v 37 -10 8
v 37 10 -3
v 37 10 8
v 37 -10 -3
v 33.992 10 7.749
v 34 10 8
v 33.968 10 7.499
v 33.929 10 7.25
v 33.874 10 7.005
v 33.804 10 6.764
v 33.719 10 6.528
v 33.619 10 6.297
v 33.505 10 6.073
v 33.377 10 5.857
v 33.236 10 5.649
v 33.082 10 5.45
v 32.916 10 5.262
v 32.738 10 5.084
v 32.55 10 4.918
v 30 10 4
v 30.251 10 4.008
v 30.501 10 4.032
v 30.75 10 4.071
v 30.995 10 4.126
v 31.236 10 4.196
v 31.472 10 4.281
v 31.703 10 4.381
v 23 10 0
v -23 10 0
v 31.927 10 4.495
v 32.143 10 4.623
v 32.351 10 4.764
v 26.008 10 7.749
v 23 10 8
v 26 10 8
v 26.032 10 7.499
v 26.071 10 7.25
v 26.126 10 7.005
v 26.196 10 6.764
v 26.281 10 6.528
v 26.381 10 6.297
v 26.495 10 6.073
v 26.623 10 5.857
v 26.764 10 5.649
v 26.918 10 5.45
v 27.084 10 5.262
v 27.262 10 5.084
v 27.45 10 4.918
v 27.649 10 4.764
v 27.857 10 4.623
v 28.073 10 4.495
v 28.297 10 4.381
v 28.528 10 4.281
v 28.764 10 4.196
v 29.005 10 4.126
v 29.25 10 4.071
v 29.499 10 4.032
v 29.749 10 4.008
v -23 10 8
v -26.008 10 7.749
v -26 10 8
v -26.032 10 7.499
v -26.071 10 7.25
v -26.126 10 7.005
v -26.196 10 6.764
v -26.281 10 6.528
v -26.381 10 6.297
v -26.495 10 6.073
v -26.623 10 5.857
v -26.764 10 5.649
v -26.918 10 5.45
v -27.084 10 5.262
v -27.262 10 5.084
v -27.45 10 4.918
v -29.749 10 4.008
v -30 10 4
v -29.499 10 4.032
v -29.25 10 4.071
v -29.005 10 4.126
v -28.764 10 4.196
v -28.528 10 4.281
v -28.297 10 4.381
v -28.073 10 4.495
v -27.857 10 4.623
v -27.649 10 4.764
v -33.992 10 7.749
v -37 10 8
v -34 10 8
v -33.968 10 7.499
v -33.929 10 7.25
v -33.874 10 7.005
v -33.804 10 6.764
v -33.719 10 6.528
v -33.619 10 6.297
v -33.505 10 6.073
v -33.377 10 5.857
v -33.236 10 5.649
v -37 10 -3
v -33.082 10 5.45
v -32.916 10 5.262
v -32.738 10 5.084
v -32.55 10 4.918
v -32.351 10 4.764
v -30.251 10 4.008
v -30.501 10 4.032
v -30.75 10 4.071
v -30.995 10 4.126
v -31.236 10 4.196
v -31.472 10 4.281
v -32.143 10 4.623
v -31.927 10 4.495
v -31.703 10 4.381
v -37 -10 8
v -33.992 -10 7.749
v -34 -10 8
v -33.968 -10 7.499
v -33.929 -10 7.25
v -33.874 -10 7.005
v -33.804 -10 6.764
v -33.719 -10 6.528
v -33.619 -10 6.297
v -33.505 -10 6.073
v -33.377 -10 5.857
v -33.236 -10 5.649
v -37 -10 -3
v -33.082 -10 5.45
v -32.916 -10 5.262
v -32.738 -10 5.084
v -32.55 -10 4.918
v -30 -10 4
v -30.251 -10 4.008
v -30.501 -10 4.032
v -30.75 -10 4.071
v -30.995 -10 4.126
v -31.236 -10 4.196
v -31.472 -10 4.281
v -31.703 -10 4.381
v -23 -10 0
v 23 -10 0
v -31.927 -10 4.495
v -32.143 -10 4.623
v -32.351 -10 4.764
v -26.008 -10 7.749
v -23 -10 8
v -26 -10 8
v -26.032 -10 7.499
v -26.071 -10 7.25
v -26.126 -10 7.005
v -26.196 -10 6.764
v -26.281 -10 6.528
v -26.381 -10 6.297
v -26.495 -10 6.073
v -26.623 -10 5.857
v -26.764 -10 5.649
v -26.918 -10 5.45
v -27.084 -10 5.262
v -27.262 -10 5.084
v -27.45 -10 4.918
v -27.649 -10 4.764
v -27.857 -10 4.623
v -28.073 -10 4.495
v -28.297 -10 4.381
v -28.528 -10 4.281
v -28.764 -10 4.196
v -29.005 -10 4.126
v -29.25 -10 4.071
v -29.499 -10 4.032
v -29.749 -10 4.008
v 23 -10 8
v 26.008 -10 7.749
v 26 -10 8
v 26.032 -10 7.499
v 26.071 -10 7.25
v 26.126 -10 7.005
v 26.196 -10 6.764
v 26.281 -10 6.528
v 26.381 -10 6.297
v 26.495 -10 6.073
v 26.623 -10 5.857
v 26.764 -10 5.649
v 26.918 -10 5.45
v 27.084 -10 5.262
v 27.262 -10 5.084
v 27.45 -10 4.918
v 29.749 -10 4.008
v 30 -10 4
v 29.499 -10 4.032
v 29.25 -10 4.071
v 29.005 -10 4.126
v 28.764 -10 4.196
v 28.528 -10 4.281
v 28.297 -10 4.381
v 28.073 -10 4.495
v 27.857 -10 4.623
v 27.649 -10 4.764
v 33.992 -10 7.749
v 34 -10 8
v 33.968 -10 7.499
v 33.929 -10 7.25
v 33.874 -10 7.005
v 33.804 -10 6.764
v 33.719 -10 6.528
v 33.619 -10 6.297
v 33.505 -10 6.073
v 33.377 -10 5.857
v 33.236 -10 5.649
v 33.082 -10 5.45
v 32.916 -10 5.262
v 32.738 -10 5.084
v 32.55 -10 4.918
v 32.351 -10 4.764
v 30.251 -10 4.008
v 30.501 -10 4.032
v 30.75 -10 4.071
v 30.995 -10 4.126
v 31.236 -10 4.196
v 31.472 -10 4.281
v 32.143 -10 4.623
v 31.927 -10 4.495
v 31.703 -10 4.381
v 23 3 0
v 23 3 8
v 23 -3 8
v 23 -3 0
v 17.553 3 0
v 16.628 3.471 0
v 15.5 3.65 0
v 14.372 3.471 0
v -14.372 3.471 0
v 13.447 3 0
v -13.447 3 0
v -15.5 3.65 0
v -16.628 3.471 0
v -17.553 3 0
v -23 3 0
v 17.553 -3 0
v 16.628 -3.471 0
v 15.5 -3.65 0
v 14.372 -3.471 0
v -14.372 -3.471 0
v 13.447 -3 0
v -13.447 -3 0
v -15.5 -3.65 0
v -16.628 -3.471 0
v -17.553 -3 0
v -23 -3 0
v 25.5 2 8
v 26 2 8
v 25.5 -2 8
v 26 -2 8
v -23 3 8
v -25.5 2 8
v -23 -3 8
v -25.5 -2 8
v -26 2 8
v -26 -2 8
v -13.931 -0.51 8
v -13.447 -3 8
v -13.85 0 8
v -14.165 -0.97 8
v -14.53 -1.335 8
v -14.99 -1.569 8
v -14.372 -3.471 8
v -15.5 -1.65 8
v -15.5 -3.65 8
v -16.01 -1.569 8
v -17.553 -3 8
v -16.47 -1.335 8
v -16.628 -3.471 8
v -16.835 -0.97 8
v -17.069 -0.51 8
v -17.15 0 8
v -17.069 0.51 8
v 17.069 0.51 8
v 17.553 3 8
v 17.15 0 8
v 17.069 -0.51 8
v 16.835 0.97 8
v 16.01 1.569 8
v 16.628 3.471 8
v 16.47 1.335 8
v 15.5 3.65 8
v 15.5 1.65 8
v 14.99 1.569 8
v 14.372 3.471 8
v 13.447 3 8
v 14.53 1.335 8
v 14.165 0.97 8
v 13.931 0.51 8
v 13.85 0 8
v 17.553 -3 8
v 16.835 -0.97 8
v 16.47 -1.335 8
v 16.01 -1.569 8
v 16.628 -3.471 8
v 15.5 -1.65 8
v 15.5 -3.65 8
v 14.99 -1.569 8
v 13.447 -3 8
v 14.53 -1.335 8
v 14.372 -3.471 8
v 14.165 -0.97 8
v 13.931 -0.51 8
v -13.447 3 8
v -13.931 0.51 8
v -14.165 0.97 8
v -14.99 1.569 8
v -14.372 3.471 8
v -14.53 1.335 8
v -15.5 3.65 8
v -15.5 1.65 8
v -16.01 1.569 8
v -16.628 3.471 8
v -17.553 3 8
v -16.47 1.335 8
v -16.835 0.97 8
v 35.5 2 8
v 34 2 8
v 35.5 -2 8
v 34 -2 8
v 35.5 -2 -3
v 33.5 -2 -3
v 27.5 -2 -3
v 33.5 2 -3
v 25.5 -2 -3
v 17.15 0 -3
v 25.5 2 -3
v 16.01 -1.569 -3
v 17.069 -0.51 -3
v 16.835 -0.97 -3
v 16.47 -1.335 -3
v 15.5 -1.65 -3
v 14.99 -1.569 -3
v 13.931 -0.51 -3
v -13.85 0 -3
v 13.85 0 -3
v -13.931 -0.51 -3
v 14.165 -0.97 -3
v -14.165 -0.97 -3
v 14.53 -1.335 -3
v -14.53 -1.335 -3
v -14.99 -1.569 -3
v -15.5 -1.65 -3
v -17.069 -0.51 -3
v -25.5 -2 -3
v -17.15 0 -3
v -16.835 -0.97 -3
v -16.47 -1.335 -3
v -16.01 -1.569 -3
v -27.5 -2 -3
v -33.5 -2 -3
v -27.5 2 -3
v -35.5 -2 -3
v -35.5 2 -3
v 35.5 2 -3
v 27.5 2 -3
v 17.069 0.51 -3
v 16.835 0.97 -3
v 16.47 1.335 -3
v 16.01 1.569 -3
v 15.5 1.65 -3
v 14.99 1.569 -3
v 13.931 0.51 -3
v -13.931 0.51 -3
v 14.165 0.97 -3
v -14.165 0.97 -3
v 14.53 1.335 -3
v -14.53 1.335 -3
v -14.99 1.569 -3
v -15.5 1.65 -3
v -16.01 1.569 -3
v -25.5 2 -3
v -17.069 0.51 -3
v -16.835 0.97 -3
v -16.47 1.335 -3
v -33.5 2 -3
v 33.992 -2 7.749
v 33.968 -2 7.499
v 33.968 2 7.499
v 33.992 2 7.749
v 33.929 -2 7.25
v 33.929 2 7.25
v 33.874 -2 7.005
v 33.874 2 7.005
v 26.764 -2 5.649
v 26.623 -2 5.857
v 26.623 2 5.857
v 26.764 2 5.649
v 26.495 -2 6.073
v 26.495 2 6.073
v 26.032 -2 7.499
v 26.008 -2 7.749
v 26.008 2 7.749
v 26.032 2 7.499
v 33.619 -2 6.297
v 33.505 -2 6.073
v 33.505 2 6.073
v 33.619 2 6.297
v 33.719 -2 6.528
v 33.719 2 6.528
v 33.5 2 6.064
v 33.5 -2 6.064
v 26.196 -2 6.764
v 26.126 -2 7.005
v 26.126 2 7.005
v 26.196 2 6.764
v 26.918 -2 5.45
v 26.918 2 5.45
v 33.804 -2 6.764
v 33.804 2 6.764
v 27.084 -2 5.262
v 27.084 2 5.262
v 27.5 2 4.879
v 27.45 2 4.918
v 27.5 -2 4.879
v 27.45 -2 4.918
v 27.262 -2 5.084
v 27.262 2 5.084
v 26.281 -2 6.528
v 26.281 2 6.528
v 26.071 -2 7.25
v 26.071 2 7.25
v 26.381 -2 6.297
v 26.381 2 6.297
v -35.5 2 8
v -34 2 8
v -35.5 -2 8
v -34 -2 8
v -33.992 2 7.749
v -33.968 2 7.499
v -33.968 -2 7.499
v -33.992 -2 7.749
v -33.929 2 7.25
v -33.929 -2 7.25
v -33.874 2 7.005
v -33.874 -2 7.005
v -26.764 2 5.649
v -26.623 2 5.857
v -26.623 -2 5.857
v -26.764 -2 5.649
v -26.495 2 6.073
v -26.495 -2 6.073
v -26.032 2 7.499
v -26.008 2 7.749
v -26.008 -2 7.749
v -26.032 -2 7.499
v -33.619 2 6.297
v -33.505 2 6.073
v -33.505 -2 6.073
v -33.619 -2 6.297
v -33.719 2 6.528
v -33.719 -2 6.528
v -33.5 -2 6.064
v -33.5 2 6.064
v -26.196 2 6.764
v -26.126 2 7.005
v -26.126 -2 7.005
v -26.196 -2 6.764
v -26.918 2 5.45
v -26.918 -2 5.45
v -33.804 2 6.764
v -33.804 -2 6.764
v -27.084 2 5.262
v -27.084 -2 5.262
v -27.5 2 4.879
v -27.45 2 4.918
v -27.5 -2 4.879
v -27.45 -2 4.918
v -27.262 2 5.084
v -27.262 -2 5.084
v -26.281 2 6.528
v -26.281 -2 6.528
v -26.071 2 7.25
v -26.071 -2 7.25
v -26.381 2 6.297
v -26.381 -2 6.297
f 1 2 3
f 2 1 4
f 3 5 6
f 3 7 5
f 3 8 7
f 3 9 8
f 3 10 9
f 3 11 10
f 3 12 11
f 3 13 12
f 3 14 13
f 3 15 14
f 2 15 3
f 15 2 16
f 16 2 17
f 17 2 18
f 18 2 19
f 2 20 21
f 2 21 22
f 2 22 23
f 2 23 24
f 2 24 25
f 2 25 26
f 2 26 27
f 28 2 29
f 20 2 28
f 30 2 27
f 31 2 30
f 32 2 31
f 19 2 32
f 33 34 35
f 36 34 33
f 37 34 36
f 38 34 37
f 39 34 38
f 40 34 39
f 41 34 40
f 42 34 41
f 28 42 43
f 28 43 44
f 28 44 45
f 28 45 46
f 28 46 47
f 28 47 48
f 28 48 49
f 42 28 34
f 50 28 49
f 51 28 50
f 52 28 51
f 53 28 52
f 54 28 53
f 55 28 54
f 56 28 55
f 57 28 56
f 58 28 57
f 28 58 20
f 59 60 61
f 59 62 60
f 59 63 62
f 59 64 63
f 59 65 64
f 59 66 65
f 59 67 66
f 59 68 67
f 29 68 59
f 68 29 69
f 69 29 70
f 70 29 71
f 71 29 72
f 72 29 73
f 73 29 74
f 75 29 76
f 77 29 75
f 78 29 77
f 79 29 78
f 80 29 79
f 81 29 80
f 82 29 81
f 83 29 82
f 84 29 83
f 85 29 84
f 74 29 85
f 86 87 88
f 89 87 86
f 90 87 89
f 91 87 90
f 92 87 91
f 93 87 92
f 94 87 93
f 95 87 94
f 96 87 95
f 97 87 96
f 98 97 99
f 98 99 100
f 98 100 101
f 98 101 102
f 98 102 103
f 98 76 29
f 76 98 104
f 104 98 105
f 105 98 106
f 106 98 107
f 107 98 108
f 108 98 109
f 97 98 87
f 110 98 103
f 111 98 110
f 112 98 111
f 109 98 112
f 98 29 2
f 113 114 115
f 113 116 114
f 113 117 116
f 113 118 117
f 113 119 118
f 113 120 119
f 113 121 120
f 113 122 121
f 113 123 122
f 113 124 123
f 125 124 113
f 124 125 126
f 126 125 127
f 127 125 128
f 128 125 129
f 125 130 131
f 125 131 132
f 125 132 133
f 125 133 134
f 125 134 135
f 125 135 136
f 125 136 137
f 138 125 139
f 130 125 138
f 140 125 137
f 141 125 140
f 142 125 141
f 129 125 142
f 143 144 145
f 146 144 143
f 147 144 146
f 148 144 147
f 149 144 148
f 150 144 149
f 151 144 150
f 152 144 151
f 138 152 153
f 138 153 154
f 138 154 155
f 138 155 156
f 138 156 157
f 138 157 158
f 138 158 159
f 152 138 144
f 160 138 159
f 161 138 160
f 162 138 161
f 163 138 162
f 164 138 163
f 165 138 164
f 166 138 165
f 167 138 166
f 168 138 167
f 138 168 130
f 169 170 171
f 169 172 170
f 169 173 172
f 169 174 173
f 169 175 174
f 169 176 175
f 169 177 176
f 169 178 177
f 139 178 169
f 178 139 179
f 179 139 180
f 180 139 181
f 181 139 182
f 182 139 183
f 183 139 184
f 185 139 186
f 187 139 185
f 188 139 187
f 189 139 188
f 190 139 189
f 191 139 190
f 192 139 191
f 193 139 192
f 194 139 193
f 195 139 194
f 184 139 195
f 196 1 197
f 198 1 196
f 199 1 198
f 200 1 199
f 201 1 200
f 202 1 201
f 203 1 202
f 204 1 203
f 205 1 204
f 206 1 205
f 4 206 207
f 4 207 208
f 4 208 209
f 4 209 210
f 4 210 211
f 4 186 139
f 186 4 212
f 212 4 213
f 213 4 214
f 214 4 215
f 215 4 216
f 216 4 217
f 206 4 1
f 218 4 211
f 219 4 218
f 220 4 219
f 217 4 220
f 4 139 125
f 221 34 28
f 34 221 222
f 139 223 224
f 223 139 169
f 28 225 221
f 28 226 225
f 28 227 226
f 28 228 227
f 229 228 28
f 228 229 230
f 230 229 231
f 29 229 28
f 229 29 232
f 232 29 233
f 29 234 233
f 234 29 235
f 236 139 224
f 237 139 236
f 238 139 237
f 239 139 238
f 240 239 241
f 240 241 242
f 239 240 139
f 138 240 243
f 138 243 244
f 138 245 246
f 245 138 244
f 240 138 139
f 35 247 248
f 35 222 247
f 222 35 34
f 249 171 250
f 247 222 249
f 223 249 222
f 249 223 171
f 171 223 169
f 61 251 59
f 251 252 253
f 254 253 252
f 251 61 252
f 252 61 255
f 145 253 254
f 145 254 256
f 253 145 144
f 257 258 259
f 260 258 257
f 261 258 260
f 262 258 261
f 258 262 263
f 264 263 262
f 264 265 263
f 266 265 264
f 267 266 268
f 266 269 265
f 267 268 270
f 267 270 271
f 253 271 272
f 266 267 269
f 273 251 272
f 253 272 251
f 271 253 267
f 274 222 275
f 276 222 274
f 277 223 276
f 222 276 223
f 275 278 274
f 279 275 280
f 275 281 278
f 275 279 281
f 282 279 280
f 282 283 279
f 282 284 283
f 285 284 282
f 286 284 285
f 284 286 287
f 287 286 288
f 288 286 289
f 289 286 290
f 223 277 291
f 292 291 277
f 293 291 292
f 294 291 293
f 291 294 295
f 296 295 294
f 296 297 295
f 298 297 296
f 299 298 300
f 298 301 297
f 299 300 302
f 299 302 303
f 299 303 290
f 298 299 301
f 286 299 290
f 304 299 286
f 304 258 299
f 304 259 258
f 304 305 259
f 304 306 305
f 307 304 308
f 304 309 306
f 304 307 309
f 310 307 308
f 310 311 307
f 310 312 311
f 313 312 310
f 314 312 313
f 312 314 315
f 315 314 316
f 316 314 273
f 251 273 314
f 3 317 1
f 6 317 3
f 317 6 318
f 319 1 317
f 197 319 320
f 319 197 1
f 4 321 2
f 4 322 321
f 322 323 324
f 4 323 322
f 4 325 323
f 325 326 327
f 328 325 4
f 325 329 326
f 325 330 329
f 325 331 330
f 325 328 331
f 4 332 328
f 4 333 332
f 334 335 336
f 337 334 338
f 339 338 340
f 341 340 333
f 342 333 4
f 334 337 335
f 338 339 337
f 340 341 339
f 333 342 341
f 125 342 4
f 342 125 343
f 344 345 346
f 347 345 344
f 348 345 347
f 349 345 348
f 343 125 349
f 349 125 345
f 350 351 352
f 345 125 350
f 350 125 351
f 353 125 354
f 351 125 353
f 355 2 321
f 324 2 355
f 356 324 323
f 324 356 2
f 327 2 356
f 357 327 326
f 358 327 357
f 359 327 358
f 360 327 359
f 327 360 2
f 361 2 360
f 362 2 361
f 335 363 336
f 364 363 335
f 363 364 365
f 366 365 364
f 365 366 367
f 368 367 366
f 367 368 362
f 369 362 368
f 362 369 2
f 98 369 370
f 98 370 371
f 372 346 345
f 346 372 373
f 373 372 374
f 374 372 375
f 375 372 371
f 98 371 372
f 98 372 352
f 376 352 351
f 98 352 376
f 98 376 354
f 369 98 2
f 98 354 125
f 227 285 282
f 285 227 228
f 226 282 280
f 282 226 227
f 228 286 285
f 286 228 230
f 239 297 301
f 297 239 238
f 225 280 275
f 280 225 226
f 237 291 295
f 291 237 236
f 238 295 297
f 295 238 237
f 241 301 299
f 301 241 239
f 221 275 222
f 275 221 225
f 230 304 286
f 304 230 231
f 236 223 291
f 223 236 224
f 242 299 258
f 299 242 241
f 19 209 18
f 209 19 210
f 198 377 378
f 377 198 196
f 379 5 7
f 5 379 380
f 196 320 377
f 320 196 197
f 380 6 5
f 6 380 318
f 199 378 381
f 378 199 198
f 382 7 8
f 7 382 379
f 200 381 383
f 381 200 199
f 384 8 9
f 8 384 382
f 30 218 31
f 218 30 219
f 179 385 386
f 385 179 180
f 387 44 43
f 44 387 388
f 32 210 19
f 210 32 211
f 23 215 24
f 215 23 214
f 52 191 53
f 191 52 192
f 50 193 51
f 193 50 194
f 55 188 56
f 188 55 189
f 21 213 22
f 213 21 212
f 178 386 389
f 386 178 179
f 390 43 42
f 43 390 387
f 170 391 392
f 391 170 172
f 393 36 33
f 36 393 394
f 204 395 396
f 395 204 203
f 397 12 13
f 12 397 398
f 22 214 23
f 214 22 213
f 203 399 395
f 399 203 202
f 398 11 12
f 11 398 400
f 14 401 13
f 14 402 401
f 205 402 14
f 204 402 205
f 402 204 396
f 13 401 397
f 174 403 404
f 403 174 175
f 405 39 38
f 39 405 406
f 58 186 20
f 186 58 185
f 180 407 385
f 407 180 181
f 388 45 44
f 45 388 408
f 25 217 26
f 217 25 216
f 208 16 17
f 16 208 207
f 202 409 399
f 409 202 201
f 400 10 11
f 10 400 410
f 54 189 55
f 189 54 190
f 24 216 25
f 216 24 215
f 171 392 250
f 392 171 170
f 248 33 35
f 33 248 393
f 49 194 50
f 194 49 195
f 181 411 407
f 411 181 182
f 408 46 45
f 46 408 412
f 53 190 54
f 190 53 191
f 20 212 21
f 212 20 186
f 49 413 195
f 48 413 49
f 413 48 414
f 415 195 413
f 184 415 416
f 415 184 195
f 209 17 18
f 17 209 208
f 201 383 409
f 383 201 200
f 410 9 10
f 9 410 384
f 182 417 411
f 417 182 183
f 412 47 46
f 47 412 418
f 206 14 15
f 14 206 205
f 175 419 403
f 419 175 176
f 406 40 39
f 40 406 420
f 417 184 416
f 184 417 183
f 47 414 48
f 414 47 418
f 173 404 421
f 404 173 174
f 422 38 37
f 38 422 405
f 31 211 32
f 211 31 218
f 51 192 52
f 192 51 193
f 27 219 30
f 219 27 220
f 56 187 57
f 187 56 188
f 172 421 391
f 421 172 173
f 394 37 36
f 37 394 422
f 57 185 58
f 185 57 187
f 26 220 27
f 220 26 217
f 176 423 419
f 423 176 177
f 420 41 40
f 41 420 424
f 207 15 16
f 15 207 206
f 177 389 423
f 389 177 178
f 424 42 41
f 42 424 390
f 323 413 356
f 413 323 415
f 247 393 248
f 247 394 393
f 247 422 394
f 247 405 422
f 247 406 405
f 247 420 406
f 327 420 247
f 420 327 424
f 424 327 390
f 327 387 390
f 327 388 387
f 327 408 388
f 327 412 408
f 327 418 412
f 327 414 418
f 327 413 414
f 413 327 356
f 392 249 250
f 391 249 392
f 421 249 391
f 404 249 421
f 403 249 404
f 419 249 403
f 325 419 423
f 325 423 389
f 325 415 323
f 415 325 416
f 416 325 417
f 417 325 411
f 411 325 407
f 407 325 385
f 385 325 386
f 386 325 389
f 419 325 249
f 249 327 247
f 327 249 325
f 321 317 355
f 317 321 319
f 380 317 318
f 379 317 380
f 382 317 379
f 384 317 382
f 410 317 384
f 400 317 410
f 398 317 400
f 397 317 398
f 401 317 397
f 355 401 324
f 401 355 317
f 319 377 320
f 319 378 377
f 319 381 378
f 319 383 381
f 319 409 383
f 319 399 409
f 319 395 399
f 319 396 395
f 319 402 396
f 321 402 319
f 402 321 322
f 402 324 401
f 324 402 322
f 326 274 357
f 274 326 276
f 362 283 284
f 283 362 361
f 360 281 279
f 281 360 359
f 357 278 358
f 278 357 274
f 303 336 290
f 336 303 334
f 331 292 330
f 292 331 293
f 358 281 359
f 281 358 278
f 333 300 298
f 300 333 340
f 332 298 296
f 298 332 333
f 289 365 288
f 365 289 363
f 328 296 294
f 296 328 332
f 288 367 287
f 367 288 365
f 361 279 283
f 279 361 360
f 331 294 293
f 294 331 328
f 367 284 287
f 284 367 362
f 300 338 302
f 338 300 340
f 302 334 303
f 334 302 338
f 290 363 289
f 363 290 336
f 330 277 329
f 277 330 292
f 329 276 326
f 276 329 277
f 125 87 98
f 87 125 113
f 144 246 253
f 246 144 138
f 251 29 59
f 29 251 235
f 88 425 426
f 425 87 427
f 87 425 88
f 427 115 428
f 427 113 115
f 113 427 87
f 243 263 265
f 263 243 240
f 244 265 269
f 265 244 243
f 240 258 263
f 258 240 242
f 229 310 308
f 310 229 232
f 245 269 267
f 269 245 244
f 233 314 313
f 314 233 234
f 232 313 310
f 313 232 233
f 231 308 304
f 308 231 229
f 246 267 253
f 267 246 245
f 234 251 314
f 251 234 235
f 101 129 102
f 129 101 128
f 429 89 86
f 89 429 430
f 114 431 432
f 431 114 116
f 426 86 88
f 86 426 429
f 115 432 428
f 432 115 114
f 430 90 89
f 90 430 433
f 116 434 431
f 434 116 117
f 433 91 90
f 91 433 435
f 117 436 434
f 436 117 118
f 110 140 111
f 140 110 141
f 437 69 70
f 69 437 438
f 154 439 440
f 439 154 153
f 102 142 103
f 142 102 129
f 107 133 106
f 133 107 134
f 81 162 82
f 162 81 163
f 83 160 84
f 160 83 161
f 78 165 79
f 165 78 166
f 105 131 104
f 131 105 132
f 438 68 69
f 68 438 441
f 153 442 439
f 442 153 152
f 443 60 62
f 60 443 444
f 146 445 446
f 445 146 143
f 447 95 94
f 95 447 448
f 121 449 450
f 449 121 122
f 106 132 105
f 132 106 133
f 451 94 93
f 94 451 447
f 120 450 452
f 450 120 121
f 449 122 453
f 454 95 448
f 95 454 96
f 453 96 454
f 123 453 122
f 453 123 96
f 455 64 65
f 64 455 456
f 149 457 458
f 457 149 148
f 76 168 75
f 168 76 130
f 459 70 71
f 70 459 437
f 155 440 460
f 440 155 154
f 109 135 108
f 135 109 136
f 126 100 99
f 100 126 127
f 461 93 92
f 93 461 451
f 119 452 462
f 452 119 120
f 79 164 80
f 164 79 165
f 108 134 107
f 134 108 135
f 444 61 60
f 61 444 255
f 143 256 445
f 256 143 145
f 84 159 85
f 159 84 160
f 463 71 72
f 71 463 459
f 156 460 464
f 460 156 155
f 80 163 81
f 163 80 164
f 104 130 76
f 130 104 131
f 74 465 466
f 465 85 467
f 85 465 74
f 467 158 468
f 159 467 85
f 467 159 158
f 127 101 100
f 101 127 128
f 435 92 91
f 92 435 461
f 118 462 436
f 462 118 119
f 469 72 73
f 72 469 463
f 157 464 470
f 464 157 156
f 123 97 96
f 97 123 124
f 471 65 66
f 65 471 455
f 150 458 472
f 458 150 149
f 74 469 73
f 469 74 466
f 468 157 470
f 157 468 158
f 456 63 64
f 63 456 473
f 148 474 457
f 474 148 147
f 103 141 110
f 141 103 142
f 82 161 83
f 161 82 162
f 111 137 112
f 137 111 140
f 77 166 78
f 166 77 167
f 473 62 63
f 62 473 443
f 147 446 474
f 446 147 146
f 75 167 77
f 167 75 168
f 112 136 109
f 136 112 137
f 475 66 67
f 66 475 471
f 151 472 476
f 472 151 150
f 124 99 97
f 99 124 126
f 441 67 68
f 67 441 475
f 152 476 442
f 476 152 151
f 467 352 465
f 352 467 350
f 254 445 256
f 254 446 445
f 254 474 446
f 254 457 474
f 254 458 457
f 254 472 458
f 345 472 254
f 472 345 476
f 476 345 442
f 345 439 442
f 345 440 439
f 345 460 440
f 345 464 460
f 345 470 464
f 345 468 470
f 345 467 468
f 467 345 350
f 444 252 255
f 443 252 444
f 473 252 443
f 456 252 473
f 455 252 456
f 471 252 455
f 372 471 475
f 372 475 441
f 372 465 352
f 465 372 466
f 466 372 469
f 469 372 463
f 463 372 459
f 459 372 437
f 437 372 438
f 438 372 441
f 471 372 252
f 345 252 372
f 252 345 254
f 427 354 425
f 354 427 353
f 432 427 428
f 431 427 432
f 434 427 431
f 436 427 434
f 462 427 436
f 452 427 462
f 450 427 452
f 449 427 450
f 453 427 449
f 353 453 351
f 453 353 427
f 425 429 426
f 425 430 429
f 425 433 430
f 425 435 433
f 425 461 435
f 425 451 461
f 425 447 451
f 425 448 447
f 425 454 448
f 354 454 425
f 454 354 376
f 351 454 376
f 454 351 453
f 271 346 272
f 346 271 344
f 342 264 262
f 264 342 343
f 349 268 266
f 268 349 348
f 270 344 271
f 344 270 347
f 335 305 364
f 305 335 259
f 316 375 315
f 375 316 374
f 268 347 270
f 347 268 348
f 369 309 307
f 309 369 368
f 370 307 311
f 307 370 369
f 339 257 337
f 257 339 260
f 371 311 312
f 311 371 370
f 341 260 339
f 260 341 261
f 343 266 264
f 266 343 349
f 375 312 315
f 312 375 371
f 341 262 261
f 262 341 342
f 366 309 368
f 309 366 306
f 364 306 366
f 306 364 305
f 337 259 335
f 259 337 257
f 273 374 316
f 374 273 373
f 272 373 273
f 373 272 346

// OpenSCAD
	rod_hole = 8;
	rod_distance = 60;  // Wallace = 62 ; Printrbot = 60

	printrmount();


module printrmount() {

	// rod diameter & distance

	// mount holes for zipties distance
	mountdist = rod_distance - rod_hole;
	zipperspacing = rod_hole;
	zipperwidth = 4;
	zipperlength = 2;

	// extra holes
	mountdist2 = 43;


	width = 20;
	height = 8;
	plateau_height= 3;
	flesh = 3;

	nema_hole_distance = 31;
	nema_hole_diameter = 3;
	nema_tolerance = 0.15;
	
	
	module halfmount() {

	difference() {

		difference() {
			
			union(){
				// rod hole block
				translate([rod_distance/2 - rod_hole/2 -flesh  , -rod_hole/2 - height/2  , -width/2])
				#cube([ rod_hole + flesh *2  ,rod_hole /2 + height/2 ,width]);

				// base
				translate([0, 0, - width /2 ])
				cube([rod_distance/2 + rod_hole/2 + flesh ,plateau_height,width]);

				// nema mouting cylinders
				translate([nema_hole_distance/2 , 0, 0])
				rotate([90,0,0])
				#cylinder(h=height,r=nema_hole_diameter/2 + nema_tolerance + 2,$fn=20);

				// nema mounting block
				translate([0, -height, -nema_hole_diameter ])
				cube([rod_distance/2 ,height,nema_hole_diameter*2]);
				
				
			}
			
			//translate([0, -height*1.5, - zipperwidth /2 ])
			//cube([rod_distance/2 + rod_hole/2 ,height,zipperwidth]);


		}
		
		

		// rod hole
		translate([rod_distance/2 , - rod_hole/2 -height/2   , -width])
		cylinder(r = rod_hole/2, h=width*2, $fn=100);

		//ziptie holes around rods
		translate([mountdist/2 - 1/2, -10, -zipperwidth/2])
		#cube([zipperlength, 30,zipperwidth]);
		translate([mountdist/2- 1/2 +zipperspacing, -10, -zipperwidth/2])
		#cube([zipperlength, 30,zipperwidth]);

		
		
		// nema mouting holes
		translate([nema_hole_distance/2 , 10, 0])
		rotate([90,0,0])
		#cylinder(h=50,r=nema_hole_diameter/2 + nema_tolerance,$fn=20);
		

	}

}			
	rotate([-90,0,0]) {
		halfmount();
		rotate(180, [0, 1, 0])
		halfmount();
	}


}

printrmount();
